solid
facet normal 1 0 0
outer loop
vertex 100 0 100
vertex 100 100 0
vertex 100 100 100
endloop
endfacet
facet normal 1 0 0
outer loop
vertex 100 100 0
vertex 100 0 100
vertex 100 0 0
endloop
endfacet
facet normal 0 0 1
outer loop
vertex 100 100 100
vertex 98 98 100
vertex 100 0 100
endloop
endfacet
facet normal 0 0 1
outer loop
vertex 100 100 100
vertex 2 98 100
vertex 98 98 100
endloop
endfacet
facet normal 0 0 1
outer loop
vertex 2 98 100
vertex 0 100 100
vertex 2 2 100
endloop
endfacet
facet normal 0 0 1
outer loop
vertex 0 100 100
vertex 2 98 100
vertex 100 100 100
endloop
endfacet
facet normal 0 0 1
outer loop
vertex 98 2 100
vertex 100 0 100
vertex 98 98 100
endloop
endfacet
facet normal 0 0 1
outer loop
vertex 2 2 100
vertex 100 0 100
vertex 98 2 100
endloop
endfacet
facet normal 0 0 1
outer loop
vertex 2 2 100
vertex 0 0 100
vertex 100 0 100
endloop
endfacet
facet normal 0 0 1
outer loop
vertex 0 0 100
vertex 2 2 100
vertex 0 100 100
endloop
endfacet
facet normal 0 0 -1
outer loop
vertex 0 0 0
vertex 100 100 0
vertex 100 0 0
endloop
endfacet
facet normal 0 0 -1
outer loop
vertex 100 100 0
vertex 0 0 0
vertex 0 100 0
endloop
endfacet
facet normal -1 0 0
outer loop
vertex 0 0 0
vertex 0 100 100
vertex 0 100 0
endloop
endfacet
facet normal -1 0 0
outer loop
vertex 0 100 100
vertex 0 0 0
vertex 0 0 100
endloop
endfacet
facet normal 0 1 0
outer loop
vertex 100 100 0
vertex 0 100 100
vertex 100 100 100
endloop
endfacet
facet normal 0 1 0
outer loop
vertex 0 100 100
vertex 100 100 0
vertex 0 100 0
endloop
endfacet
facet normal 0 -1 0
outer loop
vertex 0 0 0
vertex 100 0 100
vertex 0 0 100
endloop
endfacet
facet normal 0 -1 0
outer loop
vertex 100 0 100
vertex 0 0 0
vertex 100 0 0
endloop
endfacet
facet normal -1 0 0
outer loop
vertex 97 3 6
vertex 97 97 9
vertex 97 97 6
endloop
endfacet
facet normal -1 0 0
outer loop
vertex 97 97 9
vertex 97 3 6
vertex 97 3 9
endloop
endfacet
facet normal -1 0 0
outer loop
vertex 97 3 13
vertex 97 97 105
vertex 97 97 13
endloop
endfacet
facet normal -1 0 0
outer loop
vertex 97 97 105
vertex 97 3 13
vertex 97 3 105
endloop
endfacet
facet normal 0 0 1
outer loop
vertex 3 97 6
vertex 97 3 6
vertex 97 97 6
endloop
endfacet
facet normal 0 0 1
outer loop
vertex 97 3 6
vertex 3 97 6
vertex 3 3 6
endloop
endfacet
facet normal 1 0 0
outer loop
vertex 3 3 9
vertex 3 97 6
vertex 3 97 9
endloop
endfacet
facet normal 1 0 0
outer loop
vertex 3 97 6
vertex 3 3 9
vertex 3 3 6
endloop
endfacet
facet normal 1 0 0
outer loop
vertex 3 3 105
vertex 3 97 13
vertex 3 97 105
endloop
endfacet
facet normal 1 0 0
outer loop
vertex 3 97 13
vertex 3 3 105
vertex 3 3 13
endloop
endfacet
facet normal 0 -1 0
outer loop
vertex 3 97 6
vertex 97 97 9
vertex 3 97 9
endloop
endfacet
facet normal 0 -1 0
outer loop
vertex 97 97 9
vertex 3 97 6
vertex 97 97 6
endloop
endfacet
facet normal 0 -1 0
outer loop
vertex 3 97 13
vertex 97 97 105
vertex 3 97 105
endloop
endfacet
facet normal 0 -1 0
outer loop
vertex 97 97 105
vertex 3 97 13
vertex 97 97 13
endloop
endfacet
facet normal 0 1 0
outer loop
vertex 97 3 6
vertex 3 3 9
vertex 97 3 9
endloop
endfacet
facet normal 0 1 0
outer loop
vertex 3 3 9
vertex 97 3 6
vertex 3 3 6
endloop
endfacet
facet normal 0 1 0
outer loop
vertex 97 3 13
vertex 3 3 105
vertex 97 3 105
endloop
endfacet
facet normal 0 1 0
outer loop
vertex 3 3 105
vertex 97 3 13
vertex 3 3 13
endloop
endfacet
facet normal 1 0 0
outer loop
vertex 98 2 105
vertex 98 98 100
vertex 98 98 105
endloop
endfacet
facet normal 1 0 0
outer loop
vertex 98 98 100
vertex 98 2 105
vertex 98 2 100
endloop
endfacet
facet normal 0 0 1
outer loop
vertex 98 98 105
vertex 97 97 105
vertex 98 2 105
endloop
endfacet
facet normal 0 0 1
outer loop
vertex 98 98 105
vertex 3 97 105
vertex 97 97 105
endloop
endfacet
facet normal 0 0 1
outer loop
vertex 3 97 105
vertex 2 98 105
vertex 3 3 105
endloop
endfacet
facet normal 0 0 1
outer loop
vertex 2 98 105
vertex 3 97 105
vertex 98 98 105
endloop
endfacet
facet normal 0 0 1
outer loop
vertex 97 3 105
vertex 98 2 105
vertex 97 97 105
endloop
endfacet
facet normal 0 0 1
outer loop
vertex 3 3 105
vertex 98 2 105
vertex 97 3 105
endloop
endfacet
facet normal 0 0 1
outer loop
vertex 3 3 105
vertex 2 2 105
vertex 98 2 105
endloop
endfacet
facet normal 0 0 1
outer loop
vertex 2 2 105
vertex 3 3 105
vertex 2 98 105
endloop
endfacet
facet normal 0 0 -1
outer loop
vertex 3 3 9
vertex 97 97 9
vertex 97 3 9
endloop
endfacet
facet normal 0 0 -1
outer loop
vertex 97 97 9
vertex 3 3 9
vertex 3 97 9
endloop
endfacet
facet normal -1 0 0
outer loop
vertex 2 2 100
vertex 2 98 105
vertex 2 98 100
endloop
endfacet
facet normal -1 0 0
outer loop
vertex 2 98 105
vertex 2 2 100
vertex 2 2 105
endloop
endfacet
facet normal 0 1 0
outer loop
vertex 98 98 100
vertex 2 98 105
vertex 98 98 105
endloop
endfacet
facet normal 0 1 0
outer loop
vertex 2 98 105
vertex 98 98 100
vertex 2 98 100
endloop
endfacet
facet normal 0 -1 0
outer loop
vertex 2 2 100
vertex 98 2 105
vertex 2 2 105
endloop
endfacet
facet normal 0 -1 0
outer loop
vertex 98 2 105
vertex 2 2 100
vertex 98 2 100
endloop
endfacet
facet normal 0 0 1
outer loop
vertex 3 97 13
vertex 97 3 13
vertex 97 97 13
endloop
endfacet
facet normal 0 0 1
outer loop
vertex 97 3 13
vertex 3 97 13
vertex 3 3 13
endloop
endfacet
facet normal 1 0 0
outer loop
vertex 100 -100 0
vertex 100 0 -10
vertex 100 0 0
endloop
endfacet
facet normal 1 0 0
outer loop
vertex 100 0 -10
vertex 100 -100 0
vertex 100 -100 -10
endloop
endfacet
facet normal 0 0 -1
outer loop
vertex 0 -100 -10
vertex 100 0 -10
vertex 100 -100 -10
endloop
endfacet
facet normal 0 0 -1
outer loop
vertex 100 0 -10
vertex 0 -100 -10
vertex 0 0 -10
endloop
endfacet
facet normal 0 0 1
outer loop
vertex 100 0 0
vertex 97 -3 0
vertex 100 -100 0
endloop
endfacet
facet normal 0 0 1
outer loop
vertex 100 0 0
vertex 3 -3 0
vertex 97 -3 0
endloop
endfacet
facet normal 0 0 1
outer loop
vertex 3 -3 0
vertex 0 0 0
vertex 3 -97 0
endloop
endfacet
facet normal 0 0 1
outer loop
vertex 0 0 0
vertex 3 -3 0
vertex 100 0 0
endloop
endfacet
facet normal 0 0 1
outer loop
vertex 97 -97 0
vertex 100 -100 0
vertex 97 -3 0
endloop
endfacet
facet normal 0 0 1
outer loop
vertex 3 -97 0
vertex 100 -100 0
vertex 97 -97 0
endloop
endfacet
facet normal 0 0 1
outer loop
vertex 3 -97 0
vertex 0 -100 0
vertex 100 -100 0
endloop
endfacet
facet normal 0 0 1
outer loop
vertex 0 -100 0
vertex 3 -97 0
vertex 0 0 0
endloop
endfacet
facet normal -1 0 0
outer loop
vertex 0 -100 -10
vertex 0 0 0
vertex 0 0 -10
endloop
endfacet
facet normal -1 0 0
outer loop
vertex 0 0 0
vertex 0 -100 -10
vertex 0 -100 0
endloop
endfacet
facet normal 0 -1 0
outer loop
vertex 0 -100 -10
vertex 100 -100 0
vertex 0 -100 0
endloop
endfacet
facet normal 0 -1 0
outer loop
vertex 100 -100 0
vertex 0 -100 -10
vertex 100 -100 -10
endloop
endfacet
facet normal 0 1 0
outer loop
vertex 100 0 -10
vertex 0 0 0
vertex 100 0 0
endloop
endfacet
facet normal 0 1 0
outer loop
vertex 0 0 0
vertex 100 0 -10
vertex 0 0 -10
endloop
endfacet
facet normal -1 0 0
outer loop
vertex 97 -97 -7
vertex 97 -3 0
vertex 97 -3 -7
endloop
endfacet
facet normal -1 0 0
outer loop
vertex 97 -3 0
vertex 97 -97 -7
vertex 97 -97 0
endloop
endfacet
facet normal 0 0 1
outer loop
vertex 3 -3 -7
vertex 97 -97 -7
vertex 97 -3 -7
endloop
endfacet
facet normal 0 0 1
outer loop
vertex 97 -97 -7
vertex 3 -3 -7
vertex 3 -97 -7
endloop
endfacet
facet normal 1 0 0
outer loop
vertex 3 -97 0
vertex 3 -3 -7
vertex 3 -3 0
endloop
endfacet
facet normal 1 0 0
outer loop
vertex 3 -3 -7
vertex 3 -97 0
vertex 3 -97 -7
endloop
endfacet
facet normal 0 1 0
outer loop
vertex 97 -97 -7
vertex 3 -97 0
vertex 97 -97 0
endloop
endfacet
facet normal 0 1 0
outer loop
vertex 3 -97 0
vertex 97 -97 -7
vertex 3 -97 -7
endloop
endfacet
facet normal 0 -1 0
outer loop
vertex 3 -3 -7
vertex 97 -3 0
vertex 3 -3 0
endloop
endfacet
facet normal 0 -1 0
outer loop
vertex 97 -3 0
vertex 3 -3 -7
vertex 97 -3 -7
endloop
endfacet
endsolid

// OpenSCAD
//Loguncov Maxim 21.01.2014

	//Коробка
	difference() {
		cube([100,100 ,100 ]);
		translate([3,3 ,6]) {
			cube([94,94 ,94 ]);
		}
	}

	//Выступ
	difference() {
		
			translate([2,2 ,9 ]) {
				cube([96,96 ,96 ]);
			}
			translate([3, 3, 13]) {
				cube([94, 94, 94]);
			}
		
		
	}

	//Крышка
	rotate([180,0,0])
difference() {
		translate([0, 0, 0]) {
			cube([100,100 ,10 ]);
		}
		translate([3,3 , 0]) {
			cube([94,94 ,7 ]);
		}
	}
